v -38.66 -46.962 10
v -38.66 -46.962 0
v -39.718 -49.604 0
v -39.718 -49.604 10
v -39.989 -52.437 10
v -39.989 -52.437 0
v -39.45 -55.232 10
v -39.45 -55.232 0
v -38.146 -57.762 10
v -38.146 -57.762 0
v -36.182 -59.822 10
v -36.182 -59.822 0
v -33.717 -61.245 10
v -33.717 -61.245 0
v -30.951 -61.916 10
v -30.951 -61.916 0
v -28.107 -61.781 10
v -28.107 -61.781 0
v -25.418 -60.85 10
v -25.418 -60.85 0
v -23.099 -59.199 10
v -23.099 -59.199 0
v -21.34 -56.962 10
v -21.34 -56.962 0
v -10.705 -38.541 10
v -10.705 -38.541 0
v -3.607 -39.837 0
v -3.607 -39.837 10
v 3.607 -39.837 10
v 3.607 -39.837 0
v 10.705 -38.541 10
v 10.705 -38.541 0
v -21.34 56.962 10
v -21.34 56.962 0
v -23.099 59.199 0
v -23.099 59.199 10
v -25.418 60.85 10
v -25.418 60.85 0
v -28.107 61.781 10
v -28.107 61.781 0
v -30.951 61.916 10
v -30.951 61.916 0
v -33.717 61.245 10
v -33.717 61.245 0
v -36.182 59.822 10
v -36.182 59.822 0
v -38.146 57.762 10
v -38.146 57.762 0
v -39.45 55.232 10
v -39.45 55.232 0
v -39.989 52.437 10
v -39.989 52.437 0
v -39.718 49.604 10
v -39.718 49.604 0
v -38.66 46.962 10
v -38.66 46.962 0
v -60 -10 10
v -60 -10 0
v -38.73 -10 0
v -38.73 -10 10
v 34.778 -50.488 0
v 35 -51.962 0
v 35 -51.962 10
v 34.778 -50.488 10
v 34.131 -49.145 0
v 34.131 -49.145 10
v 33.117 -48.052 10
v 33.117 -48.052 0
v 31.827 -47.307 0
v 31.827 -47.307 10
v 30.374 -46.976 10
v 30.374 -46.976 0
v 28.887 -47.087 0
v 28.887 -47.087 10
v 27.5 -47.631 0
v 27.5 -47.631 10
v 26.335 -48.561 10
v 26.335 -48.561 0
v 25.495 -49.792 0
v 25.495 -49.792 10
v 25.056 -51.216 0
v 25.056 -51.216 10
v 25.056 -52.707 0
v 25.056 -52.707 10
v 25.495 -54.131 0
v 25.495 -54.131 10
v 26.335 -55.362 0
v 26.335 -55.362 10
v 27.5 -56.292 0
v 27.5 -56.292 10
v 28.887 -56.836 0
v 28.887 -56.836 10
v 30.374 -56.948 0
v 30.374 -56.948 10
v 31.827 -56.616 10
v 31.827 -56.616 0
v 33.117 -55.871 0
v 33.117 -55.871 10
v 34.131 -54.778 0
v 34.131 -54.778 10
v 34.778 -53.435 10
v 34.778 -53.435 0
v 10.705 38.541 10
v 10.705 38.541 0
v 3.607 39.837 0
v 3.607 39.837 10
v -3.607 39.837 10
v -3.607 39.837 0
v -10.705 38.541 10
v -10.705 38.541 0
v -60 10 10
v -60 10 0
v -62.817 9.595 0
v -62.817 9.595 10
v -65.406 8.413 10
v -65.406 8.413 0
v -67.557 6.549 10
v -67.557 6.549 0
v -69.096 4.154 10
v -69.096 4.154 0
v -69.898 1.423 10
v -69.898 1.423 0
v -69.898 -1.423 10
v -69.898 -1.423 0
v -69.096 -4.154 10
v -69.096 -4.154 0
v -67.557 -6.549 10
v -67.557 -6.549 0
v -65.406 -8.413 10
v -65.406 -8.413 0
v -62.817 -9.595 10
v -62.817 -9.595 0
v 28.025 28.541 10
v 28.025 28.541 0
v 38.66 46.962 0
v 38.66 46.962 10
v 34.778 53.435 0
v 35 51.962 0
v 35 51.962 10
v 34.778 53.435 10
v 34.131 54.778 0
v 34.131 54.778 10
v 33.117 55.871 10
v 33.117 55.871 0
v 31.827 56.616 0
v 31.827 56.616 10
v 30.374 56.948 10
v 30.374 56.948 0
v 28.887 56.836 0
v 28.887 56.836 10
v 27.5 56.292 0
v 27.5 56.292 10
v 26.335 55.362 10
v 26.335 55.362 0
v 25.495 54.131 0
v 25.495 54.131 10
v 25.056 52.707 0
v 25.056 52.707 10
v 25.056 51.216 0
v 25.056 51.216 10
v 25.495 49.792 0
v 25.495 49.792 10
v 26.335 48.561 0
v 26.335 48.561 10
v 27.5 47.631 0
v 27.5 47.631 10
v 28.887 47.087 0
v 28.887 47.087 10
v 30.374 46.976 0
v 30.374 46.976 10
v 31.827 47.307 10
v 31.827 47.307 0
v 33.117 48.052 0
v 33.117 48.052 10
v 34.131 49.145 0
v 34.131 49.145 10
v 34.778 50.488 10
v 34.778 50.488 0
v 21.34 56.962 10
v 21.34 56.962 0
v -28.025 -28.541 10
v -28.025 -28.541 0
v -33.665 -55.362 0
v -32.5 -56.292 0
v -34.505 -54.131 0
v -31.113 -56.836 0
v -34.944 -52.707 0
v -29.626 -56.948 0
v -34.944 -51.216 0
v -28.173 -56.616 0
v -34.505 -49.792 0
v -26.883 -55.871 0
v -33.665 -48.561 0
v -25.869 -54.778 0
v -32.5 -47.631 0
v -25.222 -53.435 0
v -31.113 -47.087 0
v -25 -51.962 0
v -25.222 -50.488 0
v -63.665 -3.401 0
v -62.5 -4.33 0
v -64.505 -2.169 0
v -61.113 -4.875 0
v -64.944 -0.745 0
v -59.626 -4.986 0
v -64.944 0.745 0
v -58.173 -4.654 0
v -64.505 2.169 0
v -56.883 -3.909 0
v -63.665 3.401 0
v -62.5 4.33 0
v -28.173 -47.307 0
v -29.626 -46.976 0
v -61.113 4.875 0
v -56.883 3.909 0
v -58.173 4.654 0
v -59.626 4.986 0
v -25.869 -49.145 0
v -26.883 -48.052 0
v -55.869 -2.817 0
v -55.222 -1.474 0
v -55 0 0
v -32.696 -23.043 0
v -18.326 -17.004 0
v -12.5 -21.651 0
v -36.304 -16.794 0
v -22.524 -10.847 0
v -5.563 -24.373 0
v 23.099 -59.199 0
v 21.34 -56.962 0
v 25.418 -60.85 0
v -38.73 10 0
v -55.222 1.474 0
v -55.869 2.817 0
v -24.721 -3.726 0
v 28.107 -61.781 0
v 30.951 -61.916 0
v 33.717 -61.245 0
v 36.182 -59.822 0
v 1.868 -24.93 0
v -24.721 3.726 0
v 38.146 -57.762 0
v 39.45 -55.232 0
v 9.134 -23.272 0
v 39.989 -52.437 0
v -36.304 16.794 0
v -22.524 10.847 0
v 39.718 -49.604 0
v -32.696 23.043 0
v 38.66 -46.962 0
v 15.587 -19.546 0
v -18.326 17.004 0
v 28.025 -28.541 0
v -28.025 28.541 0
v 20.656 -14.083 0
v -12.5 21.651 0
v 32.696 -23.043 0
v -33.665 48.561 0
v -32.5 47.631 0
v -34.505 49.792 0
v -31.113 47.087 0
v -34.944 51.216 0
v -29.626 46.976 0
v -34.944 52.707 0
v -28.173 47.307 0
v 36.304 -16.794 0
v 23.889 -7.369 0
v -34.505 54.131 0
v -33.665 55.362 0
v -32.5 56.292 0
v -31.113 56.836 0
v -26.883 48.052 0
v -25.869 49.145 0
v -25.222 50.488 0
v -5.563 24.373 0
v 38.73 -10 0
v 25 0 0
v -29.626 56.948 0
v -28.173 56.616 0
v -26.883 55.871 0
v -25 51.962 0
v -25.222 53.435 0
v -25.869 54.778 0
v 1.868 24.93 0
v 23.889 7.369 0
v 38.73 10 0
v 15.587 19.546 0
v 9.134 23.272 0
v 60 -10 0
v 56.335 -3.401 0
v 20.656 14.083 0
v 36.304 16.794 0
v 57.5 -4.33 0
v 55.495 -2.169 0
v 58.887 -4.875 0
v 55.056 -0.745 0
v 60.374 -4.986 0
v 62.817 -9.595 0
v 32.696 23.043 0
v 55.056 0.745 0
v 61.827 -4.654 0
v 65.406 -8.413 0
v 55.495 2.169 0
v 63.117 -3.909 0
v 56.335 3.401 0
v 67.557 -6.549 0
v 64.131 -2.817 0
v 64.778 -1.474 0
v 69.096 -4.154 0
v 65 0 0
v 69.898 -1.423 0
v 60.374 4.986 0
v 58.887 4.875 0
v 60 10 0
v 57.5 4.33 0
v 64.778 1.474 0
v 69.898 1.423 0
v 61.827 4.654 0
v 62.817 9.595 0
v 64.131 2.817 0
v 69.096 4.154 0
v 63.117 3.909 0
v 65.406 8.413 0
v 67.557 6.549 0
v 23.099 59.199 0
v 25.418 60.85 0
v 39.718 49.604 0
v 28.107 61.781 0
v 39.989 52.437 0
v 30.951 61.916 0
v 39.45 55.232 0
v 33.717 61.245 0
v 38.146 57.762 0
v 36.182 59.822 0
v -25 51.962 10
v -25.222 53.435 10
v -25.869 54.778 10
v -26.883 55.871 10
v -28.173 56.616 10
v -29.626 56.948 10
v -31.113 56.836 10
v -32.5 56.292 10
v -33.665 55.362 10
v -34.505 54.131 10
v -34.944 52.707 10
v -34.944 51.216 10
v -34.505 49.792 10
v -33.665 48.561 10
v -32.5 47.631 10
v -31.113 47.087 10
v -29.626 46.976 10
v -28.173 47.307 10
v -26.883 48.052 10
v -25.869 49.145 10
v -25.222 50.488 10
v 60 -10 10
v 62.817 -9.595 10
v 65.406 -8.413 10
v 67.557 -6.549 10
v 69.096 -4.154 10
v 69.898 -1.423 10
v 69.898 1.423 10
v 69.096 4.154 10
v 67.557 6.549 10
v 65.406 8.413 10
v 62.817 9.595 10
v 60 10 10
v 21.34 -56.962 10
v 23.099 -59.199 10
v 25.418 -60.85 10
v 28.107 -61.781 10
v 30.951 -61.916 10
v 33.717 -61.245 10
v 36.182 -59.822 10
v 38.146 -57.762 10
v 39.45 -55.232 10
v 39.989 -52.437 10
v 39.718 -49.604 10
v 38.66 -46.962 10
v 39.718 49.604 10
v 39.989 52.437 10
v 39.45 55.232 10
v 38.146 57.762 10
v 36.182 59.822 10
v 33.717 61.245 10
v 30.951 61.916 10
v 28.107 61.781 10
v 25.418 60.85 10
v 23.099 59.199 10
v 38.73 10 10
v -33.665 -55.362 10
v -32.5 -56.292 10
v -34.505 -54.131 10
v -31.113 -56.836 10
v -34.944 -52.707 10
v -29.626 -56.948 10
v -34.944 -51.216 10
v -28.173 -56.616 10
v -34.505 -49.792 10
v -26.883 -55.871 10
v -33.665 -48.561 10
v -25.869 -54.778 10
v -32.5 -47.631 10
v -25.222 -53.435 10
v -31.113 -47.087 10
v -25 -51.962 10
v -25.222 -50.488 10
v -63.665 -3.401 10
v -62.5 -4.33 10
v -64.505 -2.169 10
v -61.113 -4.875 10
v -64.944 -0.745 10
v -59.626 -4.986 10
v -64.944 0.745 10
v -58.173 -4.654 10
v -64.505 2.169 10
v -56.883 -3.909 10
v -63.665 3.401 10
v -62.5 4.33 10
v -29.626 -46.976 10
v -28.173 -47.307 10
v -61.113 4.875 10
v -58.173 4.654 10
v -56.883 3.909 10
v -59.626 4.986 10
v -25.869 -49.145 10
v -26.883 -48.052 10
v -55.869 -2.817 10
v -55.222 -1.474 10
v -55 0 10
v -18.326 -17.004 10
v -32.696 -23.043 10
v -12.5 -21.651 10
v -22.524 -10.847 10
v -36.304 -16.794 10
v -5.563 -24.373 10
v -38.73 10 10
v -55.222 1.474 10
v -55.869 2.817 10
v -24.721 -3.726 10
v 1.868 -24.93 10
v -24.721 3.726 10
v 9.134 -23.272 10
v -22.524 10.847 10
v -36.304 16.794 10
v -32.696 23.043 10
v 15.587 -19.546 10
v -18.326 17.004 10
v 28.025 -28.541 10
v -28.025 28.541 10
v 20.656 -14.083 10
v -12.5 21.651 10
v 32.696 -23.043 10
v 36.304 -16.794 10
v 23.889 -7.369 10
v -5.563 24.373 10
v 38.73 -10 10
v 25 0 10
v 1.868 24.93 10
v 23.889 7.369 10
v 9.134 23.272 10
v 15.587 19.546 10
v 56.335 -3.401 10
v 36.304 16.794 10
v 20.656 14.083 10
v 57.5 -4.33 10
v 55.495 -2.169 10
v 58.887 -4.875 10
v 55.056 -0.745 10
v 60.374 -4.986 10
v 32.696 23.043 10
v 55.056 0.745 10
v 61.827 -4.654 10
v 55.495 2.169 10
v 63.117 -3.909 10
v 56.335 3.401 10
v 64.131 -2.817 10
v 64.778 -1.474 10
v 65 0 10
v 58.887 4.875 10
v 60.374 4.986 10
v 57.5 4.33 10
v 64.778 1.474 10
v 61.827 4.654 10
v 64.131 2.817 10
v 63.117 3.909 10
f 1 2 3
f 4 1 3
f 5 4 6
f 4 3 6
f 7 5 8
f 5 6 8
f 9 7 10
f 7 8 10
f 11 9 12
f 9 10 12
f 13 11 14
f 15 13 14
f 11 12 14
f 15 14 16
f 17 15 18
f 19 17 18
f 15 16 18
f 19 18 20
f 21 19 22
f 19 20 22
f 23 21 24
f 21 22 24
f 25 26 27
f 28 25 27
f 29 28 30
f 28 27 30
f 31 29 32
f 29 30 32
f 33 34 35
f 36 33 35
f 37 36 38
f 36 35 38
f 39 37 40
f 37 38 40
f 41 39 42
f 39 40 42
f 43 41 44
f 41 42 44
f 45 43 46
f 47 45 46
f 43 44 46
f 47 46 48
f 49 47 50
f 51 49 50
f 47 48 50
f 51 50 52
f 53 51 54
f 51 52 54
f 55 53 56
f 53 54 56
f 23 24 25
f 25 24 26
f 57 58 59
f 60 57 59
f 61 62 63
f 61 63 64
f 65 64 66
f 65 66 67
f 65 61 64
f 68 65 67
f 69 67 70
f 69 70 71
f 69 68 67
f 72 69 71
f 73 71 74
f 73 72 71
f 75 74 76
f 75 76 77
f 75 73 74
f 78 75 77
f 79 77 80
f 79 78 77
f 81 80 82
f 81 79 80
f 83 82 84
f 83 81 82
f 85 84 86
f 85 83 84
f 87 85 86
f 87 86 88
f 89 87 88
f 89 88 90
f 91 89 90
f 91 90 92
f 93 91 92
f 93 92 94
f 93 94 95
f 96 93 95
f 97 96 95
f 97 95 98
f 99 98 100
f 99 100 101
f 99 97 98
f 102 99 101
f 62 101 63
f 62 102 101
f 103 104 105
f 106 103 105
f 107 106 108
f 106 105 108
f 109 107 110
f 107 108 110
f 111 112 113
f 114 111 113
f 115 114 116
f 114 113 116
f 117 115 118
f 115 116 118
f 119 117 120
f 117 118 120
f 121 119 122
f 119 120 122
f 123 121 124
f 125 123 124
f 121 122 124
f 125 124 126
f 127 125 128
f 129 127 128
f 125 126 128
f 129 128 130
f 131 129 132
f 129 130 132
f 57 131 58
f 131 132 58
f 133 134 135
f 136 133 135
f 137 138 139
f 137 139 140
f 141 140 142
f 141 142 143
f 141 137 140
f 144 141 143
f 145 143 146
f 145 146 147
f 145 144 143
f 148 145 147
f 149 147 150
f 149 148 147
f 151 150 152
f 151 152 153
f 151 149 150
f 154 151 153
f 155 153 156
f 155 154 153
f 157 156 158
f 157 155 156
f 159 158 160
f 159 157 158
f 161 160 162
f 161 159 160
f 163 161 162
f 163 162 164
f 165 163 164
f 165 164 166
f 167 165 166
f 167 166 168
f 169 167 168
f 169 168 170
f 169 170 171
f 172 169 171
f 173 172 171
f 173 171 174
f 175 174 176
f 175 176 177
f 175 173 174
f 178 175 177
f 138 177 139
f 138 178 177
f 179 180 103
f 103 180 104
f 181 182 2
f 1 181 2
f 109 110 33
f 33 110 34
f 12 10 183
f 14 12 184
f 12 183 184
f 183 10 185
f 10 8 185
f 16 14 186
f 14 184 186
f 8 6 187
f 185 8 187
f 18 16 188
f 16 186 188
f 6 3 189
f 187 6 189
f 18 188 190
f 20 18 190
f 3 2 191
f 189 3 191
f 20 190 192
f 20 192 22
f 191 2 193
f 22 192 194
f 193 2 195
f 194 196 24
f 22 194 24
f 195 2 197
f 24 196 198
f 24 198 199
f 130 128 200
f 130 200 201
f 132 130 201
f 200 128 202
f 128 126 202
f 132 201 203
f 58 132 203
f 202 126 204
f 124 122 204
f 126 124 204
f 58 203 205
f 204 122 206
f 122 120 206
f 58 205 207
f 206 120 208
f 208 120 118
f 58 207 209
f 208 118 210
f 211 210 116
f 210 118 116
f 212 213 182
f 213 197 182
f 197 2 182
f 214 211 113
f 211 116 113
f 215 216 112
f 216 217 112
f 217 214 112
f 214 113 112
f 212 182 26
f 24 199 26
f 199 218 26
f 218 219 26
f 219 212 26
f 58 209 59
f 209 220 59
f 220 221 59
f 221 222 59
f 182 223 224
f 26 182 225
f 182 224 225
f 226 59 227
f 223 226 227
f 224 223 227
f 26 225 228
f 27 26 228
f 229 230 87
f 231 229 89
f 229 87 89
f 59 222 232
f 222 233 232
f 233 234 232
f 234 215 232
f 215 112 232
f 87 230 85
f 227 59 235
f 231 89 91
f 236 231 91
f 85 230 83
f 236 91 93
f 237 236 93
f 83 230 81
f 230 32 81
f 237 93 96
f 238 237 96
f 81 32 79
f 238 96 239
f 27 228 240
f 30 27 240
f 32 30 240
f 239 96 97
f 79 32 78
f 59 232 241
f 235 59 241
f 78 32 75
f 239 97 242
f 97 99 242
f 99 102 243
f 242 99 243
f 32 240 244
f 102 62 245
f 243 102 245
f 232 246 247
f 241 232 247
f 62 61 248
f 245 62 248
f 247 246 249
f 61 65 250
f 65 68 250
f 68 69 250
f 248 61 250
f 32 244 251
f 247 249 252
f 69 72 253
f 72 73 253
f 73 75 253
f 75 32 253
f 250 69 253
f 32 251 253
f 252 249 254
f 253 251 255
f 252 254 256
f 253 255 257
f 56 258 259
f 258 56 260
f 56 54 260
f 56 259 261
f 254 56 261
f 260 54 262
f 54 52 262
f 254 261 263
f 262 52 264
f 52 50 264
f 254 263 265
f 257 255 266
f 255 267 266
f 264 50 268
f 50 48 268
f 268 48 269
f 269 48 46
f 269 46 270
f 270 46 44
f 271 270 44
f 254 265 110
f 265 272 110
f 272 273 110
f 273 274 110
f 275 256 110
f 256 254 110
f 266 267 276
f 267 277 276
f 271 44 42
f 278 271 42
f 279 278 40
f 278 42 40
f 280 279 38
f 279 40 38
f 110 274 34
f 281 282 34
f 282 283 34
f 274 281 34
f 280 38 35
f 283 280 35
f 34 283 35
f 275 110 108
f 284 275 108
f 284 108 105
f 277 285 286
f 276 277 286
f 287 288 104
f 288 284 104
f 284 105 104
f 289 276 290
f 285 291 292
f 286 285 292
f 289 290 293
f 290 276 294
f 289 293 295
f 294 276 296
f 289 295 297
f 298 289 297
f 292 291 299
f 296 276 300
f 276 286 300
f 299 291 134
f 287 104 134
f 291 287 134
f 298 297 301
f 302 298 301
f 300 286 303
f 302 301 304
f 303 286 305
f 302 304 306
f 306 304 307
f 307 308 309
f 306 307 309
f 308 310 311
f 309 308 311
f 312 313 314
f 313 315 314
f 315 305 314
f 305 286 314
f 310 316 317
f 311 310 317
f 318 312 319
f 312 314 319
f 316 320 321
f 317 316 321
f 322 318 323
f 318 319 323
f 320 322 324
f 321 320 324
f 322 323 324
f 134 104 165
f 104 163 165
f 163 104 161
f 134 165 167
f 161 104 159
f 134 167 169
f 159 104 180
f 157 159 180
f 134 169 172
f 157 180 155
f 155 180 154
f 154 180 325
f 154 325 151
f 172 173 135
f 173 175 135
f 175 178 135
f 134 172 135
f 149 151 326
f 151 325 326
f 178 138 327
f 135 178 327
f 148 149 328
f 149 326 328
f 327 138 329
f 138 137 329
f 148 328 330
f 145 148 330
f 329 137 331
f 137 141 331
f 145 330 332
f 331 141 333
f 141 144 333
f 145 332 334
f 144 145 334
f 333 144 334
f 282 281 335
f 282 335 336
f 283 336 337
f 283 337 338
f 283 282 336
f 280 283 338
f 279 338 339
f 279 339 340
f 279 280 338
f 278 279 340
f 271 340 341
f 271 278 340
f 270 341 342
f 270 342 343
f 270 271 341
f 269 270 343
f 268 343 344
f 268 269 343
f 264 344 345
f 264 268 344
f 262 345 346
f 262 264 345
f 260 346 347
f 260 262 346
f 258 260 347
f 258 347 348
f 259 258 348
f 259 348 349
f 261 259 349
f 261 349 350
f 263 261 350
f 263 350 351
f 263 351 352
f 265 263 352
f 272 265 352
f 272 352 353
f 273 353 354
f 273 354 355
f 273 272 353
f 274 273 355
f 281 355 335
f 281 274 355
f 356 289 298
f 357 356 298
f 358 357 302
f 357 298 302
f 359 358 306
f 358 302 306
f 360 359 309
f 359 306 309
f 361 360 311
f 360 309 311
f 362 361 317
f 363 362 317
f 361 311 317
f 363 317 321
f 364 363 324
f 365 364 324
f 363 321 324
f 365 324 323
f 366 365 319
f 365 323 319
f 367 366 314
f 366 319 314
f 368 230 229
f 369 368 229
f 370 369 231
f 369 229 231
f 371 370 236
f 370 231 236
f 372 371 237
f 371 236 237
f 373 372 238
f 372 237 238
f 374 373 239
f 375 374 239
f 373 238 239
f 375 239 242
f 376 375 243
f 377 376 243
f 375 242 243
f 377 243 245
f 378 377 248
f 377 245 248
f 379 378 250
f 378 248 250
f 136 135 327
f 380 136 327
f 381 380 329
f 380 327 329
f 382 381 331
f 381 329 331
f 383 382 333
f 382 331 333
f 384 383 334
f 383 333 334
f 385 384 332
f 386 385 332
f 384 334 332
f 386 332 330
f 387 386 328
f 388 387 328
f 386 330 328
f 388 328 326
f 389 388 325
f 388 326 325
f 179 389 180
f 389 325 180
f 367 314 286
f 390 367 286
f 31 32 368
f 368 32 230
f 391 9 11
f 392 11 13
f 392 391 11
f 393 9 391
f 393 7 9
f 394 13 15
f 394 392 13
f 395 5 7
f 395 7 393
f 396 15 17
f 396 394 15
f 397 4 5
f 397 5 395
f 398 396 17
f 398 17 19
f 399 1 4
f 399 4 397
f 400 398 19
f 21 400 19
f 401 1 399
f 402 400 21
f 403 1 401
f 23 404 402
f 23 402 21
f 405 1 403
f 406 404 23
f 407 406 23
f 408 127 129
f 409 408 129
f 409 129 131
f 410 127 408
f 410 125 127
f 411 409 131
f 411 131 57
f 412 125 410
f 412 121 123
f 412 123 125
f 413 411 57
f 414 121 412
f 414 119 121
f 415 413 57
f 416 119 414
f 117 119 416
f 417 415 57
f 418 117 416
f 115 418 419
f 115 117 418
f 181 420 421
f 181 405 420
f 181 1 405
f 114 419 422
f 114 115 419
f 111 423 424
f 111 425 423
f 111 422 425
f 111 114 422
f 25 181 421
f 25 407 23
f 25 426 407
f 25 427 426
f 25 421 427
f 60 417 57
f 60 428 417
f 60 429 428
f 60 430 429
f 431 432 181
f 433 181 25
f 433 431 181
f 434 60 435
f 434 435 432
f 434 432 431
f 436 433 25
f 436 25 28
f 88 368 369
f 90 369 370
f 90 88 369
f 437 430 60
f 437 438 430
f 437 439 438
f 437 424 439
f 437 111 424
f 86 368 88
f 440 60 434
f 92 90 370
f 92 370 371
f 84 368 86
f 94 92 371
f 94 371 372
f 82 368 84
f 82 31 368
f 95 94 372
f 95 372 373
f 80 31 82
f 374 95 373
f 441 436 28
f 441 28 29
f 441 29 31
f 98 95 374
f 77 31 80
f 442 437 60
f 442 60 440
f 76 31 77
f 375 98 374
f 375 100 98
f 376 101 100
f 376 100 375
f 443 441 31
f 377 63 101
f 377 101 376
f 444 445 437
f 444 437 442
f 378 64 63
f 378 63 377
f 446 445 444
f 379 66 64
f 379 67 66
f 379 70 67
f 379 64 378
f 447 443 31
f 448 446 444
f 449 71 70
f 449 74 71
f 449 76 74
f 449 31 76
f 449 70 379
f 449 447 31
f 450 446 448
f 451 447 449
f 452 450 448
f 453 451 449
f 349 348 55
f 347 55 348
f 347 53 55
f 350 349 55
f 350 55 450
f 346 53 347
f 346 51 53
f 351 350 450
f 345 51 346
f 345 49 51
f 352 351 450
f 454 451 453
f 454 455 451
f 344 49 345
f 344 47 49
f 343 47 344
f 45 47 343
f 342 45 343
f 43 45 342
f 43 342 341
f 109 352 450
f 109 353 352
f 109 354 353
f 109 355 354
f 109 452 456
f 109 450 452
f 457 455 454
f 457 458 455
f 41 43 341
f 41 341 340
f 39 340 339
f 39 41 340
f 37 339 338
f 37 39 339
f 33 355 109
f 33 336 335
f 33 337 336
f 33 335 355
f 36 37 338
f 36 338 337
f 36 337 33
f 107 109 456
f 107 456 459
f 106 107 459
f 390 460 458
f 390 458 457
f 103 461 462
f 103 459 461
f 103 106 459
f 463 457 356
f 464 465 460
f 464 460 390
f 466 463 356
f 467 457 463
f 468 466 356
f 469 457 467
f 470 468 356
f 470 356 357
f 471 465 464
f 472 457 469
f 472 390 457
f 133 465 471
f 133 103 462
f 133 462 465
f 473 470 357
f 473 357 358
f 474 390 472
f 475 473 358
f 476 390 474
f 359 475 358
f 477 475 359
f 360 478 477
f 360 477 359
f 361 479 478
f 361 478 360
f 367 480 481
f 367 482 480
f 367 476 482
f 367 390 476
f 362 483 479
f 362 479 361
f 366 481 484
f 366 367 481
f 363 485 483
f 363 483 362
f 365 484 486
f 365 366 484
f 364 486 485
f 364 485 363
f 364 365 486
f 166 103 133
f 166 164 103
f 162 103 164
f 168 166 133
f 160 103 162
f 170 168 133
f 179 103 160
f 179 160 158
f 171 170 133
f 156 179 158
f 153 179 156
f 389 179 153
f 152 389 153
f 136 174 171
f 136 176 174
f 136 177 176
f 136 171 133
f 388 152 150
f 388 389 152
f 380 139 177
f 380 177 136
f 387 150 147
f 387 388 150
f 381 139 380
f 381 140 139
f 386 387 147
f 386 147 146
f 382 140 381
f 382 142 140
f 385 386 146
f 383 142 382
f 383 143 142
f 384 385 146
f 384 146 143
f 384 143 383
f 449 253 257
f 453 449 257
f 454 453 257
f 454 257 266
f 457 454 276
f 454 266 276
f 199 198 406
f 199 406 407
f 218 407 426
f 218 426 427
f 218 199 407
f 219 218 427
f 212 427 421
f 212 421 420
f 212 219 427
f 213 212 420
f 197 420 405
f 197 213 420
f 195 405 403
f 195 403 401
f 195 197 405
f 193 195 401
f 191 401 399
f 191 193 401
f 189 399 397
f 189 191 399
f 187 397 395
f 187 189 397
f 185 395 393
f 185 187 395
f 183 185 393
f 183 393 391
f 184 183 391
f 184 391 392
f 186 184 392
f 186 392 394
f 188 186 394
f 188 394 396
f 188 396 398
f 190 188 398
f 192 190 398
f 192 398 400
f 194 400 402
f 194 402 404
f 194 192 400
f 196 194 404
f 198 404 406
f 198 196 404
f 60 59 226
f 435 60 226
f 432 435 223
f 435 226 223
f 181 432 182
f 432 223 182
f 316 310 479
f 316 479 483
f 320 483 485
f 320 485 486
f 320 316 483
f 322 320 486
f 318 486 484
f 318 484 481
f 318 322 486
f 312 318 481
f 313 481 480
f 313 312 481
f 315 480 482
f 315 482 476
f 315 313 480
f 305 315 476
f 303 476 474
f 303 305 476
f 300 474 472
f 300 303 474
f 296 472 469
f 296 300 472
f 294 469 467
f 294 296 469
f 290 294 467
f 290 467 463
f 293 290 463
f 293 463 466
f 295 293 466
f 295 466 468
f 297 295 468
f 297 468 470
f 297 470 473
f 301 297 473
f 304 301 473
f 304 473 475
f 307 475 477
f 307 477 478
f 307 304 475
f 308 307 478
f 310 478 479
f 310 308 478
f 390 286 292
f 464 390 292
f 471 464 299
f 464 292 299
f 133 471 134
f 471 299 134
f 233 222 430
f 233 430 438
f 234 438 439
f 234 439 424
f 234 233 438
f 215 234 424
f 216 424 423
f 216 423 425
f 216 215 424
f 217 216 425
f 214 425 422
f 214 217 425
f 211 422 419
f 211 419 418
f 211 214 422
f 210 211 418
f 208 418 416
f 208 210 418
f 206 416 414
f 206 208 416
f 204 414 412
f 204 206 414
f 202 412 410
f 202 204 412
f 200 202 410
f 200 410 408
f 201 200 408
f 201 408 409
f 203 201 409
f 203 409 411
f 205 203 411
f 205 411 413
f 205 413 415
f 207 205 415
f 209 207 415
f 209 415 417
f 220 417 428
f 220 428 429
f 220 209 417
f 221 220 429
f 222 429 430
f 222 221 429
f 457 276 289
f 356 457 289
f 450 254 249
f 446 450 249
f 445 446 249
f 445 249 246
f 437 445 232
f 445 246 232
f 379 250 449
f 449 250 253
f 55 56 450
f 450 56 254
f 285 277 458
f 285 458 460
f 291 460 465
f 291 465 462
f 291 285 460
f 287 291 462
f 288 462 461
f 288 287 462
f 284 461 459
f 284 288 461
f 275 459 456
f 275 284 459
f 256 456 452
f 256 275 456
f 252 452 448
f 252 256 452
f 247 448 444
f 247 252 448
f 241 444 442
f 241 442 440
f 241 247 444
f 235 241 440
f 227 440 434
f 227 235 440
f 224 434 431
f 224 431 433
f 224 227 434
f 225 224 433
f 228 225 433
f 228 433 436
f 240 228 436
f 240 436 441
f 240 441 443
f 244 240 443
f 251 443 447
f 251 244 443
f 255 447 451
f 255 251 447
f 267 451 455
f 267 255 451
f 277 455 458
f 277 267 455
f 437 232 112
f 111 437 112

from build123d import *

# Parameters (mm, degrees)
SKETCH1_R           = 5
SKETCH1_R_2         = 25
BOSS_EXTRUDE1_DEPTH = 10


with BuildPart() as part:
    # Sketch1 → Boss-Extrude1 (new body)
    with BuildSketch(Plane.XY):
        with BuildLine():
            Line((60, 10), (38.729833462, 10))
            ThreePointArc((38.729833462, 10), (34.641016151, 20), (28.025170769, 28.541019662))
            Line((28.025170769, 28.541019662), (38.660254038, 46.961524227))
            ThreePointArc((38.660254038, 46.961524227), (35, 60.621778265), (21.339745962, 56.961524227))
            Line((21.339745962, 56.961524227), (10.704662693, 38.541019662))
            ThreePointArc((10.704662693, 38.541019662), (0, 40), (-10.704662693, 38.541019662))
            Line((-10.704662693, 38.541019662), (-21.339745962, 56.961524227))
            ThreePointArc((-21.339745962, 56.961524227), (-35, 60.621778265), (-38.660254038, 46.961524227))
            Line((-38.660254038, 46.961524227), (-28.025170769, 28.541019662))
            ThreePointArc((-28.025170769, 28.541019662), (-34.641016151, 20), (-38.729833462, 10))
            Line((-38.729833462, 10), (-60, 10))
            ThreePointArc((-60, 10), (-70, 0), (-60, -10))
            Line((-60, -10), (-38.729833462, -10))
            ThreePointArc((-38.729833462, -10), (-34.641016151, -20), (-28.025170769, -28.541019662))
            Line((-28.025170769, -28.541019662), (-38.660254038, -46.961524227))
            ThreePointArc((-38.660254038, -46.961524227), (-35, -60.621778265), (-21.339745962, -56.961524227))
            Line((-21.339745962, -56.961524227), (-10.704662693, -38.541019662))
            ThreePointArc((-10.704662693, -38.541019662), (0, -40), (10.704662693, -38.541019662))
            Line((10.704662693, -38.541019662), (21.339745962, -56.961524227))
            ThreePointArc((21.339745962, -56.961524227), (35, -60.621778265), (38.660254038, -46.961524227))
            Line((38.660254038, -46.961524227), (28.025170769, -28.541019662))
            ThreePointArc((28.025170769, -28.541019662), (34.641016151, -20), (38.729833462, -10))
            Line((38.729833462, -10), (60, -10))
            ThreePointArc((60, -10), (70, 0), (60, 10))
        make_face()
        with Locations((60, 0)):
            Circle(SKETCH1_R, mode=Mode.SUBTRACT)
        with Locations((30, -51.961524227)):
            Circle(SKETCH1_R, mode=Mode.SUBTRACT)
        with Locations((-30, -51.961524227)):
            Circle(SKETCH1_R, mode=Mode.SUBTRACT)
        with Locations((-60, 0)):
            Circle(SKETCH1_R, mode=Mode.SUBTRACT)
        with Locations((-30, 51.961524227)):
            Circle(SKETCH1_R, mode=Mode.SUBTRACT)
        with Locations((30, 51.961524227)):
            Circle(SKETCH1_R, mode=Mode.SUBTRACT)
        Circle(SKETCH1_R_2, mode=Mode.SUBTRACT)
    extrude(amount=BOSS_EXTRUDE1_DEPTH)


solid = part.part
